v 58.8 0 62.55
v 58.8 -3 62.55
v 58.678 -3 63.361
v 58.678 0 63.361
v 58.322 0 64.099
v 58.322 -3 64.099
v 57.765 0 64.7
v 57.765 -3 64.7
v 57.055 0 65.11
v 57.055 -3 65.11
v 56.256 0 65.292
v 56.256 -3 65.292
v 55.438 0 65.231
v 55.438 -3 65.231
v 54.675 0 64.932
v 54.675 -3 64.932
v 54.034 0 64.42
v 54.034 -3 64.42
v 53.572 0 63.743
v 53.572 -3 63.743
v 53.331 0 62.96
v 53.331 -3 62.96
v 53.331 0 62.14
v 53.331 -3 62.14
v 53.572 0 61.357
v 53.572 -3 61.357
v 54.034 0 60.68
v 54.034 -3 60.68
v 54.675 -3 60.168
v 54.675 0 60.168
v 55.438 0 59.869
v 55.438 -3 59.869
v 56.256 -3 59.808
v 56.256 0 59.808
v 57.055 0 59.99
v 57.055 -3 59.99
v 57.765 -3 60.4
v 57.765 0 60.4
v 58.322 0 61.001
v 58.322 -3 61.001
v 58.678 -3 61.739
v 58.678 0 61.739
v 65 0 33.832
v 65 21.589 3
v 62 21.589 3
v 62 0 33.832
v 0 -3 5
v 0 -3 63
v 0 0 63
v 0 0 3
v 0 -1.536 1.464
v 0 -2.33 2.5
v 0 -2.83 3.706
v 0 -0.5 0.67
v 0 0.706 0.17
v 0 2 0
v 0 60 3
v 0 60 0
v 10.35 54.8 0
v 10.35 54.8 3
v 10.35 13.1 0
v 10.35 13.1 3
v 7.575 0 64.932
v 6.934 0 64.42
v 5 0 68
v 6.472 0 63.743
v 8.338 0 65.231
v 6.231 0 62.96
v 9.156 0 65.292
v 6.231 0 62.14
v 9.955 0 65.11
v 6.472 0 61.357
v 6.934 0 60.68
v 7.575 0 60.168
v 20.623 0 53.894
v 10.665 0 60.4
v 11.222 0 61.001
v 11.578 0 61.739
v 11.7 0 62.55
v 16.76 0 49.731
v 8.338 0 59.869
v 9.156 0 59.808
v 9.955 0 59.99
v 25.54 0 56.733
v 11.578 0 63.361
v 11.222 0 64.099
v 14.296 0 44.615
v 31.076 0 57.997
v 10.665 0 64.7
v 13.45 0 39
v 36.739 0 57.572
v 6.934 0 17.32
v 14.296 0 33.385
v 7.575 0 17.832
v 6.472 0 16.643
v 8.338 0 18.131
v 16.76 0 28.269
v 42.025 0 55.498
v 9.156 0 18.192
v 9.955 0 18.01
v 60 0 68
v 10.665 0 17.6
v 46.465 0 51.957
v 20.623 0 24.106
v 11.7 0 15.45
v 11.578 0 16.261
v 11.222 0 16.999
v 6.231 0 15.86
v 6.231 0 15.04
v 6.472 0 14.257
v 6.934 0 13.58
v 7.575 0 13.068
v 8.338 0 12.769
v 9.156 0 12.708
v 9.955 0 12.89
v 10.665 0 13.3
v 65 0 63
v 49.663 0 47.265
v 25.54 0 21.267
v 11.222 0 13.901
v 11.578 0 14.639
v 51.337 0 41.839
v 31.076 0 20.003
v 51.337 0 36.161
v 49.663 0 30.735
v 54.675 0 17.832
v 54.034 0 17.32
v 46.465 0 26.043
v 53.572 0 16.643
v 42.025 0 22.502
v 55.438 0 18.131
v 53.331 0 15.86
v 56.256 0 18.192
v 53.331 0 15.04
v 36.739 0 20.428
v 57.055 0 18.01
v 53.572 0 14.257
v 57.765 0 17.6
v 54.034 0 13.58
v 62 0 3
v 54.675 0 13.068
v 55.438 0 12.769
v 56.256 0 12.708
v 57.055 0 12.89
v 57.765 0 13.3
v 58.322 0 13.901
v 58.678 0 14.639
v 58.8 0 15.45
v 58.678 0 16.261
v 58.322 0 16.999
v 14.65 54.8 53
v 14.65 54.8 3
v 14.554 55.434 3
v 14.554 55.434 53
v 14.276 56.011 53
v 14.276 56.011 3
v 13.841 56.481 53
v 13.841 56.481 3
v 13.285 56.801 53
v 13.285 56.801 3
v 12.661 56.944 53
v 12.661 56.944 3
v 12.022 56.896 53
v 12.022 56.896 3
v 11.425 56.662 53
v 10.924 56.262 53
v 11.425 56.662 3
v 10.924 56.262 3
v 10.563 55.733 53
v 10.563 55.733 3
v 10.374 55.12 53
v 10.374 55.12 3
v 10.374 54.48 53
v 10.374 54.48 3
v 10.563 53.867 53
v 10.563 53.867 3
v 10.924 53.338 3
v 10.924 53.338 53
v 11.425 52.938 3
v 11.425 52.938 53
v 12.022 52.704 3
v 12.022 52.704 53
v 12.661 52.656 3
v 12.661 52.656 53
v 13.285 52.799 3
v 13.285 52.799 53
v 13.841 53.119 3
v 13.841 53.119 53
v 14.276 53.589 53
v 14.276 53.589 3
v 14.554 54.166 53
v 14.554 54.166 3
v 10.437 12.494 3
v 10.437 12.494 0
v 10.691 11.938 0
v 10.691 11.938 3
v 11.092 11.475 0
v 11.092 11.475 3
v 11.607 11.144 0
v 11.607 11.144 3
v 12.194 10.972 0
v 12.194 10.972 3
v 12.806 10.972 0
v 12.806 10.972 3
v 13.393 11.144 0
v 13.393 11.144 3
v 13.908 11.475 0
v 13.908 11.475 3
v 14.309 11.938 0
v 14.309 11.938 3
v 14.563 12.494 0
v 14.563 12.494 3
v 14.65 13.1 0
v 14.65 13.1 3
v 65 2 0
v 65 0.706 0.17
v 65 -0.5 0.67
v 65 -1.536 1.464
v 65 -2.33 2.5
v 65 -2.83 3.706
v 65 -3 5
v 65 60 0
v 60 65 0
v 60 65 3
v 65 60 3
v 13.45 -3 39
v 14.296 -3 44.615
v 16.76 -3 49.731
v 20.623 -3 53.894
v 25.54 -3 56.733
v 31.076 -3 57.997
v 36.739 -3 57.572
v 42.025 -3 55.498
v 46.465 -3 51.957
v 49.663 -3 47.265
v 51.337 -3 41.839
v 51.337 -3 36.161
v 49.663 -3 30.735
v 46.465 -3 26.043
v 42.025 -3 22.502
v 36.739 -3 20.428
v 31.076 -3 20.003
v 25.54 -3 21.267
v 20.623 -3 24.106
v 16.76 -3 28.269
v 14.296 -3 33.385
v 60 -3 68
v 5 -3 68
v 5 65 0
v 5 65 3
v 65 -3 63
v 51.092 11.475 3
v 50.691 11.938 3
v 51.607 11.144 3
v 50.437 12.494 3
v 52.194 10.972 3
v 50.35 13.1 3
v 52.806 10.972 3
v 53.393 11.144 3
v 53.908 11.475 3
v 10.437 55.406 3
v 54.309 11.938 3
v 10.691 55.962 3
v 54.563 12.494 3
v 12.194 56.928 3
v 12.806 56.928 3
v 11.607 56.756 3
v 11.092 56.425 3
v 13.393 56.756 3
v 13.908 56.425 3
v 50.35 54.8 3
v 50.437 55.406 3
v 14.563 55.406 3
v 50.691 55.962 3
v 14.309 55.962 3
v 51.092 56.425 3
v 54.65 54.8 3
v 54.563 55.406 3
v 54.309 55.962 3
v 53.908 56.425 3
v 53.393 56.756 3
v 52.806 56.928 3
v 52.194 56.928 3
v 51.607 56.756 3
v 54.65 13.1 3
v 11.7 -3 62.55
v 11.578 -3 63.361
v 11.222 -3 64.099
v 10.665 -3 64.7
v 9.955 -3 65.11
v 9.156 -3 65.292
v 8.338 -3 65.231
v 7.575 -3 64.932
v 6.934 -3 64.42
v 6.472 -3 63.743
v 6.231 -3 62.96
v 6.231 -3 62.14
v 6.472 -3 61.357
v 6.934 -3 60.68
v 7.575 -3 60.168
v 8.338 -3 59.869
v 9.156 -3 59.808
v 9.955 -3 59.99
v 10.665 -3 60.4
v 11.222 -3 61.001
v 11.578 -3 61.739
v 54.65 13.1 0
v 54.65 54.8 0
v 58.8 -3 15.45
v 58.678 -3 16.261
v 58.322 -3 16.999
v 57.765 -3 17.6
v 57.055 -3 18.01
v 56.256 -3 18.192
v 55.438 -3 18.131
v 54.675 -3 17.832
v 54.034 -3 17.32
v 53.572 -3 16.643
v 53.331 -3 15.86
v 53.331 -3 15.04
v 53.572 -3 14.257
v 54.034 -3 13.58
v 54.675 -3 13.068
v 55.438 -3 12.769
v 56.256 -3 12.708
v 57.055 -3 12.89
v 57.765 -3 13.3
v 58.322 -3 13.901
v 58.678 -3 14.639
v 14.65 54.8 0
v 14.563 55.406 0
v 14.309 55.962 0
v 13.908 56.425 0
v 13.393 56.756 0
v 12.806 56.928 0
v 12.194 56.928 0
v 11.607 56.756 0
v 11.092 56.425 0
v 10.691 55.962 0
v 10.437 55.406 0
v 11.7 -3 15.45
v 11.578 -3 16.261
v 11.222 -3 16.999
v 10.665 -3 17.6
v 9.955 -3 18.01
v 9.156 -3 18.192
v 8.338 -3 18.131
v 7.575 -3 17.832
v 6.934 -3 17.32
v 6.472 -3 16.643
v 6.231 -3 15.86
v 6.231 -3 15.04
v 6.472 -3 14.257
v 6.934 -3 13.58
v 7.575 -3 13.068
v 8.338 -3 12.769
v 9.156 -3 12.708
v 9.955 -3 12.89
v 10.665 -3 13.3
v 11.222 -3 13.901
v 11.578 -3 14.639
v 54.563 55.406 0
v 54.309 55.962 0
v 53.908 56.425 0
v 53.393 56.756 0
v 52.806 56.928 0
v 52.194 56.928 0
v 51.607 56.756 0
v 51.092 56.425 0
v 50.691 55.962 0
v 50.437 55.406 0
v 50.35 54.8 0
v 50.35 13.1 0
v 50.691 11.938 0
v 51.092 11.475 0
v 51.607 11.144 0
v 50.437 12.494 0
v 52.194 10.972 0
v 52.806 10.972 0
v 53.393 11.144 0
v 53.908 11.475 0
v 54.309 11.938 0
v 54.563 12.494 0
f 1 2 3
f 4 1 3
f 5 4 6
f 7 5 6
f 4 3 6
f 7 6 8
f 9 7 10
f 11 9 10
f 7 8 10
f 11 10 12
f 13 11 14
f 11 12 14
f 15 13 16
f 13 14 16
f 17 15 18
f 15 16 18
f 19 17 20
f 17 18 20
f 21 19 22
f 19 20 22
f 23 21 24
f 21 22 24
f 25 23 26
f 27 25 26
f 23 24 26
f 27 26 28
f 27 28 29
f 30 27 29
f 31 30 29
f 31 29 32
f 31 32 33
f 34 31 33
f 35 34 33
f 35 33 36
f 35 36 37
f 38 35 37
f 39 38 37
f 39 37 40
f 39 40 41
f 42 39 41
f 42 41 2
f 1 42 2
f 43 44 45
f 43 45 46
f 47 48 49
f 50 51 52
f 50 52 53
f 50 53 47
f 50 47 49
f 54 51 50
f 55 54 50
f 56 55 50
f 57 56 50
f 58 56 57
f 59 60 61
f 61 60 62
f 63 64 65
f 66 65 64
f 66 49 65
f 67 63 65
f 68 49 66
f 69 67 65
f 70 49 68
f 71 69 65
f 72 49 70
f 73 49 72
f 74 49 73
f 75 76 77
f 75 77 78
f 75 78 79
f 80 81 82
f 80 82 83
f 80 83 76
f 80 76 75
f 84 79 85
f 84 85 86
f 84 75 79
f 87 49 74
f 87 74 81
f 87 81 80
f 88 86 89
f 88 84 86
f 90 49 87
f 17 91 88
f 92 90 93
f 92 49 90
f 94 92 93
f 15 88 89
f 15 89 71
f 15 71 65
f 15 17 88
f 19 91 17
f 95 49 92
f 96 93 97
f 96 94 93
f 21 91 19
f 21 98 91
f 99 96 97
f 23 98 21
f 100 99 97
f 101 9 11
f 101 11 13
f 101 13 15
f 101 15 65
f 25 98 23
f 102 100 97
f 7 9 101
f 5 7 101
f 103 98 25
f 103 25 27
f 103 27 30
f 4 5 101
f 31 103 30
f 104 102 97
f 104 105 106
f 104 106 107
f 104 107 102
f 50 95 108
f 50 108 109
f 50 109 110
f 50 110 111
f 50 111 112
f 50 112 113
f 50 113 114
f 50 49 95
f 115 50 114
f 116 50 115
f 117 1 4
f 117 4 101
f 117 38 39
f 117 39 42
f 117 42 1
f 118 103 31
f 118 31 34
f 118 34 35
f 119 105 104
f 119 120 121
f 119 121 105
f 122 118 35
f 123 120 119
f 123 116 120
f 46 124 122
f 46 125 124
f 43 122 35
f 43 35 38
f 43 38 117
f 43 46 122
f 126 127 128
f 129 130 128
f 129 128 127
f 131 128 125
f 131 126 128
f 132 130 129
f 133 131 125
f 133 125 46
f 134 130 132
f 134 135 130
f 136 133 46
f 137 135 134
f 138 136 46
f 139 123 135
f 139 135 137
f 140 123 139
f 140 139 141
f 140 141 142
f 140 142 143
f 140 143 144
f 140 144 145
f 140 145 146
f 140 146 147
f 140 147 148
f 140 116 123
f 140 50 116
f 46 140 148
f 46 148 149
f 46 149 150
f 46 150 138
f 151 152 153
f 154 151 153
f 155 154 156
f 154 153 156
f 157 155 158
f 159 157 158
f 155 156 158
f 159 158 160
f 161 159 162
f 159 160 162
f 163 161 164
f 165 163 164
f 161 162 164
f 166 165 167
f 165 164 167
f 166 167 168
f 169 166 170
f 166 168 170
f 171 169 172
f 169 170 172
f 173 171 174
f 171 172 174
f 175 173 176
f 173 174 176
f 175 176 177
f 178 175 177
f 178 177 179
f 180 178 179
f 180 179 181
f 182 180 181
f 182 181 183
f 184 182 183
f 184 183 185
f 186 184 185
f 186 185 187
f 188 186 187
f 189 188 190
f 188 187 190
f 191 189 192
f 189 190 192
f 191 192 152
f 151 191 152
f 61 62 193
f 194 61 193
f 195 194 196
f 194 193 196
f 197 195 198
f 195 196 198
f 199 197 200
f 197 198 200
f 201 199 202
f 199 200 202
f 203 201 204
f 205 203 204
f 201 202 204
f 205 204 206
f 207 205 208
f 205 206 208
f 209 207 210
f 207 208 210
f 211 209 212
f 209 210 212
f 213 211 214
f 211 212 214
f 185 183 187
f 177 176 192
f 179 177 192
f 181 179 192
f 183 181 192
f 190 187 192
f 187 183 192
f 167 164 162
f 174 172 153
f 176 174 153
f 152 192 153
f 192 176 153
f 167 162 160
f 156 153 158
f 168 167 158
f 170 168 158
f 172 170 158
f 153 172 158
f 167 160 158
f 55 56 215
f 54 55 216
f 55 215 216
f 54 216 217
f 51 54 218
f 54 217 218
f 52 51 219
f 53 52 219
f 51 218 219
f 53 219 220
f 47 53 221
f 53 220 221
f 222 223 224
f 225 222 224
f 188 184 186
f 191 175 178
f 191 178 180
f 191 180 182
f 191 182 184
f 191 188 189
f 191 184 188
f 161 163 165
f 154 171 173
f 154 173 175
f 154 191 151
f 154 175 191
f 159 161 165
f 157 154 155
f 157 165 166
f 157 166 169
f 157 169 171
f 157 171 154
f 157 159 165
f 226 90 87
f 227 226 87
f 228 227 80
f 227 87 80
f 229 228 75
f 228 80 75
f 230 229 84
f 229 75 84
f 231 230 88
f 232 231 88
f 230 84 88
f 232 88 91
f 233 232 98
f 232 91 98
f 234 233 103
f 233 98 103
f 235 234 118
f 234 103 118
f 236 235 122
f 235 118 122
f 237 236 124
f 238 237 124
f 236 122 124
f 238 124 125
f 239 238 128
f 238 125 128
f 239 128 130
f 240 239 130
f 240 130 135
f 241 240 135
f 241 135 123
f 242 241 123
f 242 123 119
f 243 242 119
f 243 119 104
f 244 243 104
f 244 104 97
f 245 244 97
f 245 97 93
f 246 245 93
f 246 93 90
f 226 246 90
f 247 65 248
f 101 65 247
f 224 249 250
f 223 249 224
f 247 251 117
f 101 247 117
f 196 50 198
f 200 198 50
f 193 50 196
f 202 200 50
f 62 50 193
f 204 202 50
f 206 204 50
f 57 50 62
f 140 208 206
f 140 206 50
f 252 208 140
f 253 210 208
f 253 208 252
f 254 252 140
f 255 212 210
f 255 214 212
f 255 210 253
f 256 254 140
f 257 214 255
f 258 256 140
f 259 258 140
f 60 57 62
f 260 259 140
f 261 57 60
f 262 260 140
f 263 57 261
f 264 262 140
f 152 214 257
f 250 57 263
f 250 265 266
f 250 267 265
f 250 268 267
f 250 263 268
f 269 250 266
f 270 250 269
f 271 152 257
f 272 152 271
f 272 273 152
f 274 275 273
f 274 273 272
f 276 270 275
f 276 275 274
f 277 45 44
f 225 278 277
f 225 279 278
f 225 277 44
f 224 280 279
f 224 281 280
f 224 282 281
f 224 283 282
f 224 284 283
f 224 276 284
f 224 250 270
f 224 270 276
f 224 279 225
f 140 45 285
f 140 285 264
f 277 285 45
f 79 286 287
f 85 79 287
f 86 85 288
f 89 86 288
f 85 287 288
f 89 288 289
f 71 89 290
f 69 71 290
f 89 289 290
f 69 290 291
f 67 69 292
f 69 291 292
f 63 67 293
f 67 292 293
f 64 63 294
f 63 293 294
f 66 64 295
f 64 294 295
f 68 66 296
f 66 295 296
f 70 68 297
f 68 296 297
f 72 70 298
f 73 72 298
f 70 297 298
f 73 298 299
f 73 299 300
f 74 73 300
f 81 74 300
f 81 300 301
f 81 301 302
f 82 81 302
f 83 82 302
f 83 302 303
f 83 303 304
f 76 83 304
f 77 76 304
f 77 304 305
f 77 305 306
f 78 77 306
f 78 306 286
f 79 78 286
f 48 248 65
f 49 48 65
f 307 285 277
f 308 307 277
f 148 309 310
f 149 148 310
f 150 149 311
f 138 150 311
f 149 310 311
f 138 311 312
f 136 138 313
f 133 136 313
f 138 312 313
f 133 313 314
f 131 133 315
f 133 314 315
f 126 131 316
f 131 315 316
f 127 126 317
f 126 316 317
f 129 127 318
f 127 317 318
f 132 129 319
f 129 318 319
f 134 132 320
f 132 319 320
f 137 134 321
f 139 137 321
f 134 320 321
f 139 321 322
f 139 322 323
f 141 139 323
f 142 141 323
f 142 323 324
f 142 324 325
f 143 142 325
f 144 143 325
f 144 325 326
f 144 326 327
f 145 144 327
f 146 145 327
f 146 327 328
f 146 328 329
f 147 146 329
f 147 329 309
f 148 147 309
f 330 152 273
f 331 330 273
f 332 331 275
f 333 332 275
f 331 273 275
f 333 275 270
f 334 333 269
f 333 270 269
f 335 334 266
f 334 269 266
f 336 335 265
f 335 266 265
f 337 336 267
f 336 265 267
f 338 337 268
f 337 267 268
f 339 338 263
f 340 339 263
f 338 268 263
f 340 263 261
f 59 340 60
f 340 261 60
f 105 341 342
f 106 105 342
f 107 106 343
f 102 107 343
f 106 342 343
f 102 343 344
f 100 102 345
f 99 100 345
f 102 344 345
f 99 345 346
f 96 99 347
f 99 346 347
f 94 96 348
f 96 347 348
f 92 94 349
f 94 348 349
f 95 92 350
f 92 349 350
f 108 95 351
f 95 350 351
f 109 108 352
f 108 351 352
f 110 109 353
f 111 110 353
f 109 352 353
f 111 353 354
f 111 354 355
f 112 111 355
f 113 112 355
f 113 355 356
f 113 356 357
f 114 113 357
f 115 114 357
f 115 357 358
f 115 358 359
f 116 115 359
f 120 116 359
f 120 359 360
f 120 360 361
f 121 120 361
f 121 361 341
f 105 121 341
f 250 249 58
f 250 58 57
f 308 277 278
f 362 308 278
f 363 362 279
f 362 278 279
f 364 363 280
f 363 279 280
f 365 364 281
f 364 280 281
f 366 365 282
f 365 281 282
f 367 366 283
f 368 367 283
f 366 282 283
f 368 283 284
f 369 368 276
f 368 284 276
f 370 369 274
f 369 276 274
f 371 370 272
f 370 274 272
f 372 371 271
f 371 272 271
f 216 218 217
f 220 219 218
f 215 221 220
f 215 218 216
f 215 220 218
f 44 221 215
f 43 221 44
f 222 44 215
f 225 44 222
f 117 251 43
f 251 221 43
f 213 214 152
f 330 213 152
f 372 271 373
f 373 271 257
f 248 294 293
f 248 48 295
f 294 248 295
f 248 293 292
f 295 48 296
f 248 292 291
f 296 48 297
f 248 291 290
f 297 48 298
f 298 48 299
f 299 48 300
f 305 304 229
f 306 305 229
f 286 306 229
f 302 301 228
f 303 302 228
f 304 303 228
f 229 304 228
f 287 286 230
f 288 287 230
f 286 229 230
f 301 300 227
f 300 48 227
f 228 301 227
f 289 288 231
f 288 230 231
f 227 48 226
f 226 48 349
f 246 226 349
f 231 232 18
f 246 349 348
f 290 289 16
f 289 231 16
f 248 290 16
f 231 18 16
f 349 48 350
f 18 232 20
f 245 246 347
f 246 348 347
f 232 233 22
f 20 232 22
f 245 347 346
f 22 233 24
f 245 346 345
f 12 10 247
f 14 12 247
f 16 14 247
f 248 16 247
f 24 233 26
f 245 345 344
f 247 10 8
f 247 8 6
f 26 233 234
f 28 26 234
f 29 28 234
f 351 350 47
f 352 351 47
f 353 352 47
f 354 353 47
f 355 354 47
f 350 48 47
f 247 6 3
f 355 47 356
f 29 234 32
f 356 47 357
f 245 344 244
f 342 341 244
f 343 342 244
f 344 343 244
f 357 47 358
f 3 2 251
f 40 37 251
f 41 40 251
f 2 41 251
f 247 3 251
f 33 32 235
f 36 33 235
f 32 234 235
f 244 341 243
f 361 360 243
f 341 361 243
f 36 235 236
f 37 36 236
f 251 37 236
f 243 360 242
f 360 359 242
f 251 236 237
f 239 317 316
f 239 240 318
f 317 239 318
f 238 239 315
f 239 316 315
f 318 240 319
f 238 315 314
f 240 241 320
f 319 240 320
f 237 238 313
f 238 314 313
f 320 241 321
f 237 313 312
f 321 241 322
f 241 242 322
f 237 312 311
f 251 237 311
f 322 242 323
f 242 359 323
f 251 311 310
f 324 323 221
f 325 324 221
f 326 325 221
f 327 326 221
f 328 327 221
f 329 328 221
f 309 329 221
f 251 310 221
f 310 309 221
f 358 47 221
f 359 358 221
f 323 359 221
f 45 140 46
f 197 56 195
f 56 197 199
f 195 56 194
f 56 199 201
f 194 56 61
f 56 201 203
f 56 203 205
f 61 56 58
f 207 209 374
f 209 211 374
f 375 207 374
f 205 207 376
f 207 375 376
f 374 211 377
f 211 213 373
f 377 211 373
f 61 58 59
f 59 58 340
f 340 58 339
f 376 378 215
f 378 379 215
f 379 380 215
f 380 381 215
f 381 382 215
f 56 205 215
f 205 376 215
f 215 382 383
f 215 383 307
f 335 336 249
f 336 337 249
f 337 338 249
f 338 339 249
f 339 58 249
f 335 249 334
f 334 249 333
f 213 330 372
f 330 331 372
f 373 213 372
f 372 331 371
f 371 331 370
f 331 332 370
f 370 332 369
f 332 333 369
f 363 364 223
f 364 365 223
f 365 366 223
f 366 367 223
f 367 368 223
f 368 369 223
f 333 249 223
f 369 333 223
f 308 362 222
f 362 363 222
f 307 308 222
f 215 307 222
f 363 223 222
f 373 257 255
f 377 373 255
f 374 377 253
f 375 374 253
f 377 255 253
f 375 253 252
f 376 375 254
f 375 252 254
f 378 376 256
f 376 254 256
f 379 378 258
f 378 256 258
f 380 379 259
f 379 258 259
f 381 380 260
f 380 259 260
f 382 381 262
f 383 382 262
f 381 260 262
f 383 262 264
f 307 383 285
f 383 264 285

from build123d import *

# Parameters (mm, degrees)
F0_W      = 65
F0_H      = 65
F1_DEPTH  = 3
F0_H_2    = 3
F2_DEPTH  = 68
F3_R      = 5
F4_SIZE   = 5
F6_D      = 5.5
F5_R      = 19.05
F7_DEPTH  = 25
F9_DEPTH  = 3
F10_SIZE  = 5
F12_DEPTH = 25
F13_DEPTH = 50


with BuildPart() as f1:
    # F0 (on Top) → F1 (new body)
    with BuildSketch(Plane.XY):
        with Locations((32.5, 32.5)):
            Rectangle(F0_W, F0_H)
    extrude(amount=F1_DEPTH)

    # F0 (on Top) → F2 (join)
    with BuildSketch(Plane.XY):
        with Locations((32.5, -1.5)):
            Rectangle(F0_W, F0_H_2)
    extrude(amount=F2_DEPTH)

    # F3
    f3_edges = [f1.edges().sort_by_distance(p)[0] for p in [
        (32.5, -3, 0),
    ]]
    fillet(f3_edges, radius=F3_R)

    # F4
    f4_edges = [f1.edges().sort_by_distance(p)[0] for p in [
        (65, -1.5, 68),
        (0, -1.5, 68),
    ]]
    chamfer(f4_edges, length=F4_SIZE)

    # F6 (through all)
    with Locations(Plane(origin=(0, 0, 0), x_dir=(-1, 0, 0), z_dir=(0, 1, 0))):
        with Locations((-56.05, 62.55), (-8.95, 62.55), (-8.95, 15.45), (-56.05, 15.45)):
            Hole(F6_D / 2)

    # F5 (on face) → F7 (cut)
    with BuildSketch(Plane(origin=(0, 0, 0), x_dir=(-1, 0, 0), z_dir=(0, 1, 0))):
        with Locations((-32.5, 39)):
            Circle(F5_R)
    extrude(amount=-F7_DEPTH, mode=Mode.SUBTRACT)

    # F8 (on face) → F9 (join)
    with BuildSketch(Plane.YZ.offset(65)):
        Polygon((21.588552, 3), (0, 33.831648), (0, 3), align=None)
    extrude(amount=-F9_DEPTH)

    # F10
    f10_edges = [f1.edges().sort_by_distance(p)[0] for p in [
        (65, 65, 1.5),
        (0, 65, 1.5),
    ]]
    chamfer(f10_edges, length=F10_SIZE)

    # F11 (on face) → F12 (cut)
    with BuildSketch(Plane.XY.offset(3)):
        with BuildLine():
            Line((14.65, 13.1), (14.65, 54.8))
            ThreePointArc((14.65, 54.8), (12.5, 52.65), (10.35, 54.8))
            Line((10.35, 54.8), (10.35, 13.1))
            ThreePointArc((10.35, 13.1), (12.5, 15.25), (14.65, 13.1))
        make_face()
        with BuildLine():
            ThreePointArc((54.65, 54.8), (52.5, 52.65), (50.35, 54.8))
            Line((50.35, 54.8), (50.35, 13.1))
            ThreePointArc((50.35, 13.1), (52.5, 15.25), (54.65, 13.1))
            Line((54.65, 13.1), (54.65, 54.8))
        make_face()
        with BuildLine():
            ThreePointArc((54.65, 13.1), (52.5, 15.25), (50.35, 13.1))
            ThreePointArc((50.35, 13.1), (52.5, 10.95), (54.65, 13.1))
        make_face()
        with BuildLine():
            ThreePointArc((10.35, 13.1), (12.5, 10.95), (14.65, 13.1))
            ThreePointArc((14.65, 13.1), (12.5, 15.25), (10.35, 13.1))
        make_face()
        with BuildLine():
            ThreePointArc((54.65, 54.8), (52.5, 56.95), (50.35, 54.8))
            ThreePointArc((50.35, 54.8), (52.5, 52.65), (54.65, 54.8))
        make_face()
        with BuildLine():
            ThreePointArc((10.35, 54.8), (12.5, 52.65), (14.65, 54.8))
            ThreePointArc((14.65, 54.8), (12.5, 56.95), (10.35, 54.8))
        make_face()
    extrude(amount=-F12_DEPTH, mode=Mode.SUBTRACT)


with BuildPart() as f13:
    # F11 (on face) → F13 (new body)
    with BuildSketch(Plane.XY.offset(3)):
        with BuildLine():
            ThreePointArc((10.35, 54.8), (12.5, 52.65), (14.65, 54.8))
            ThreePointArc((14.65, 54.8), (12.5, 56.95), (10.35, 54.8))
        make_face()
    extrude(amount=F13_DEPTH)


solid = Compound([f1.part, f13.part])
